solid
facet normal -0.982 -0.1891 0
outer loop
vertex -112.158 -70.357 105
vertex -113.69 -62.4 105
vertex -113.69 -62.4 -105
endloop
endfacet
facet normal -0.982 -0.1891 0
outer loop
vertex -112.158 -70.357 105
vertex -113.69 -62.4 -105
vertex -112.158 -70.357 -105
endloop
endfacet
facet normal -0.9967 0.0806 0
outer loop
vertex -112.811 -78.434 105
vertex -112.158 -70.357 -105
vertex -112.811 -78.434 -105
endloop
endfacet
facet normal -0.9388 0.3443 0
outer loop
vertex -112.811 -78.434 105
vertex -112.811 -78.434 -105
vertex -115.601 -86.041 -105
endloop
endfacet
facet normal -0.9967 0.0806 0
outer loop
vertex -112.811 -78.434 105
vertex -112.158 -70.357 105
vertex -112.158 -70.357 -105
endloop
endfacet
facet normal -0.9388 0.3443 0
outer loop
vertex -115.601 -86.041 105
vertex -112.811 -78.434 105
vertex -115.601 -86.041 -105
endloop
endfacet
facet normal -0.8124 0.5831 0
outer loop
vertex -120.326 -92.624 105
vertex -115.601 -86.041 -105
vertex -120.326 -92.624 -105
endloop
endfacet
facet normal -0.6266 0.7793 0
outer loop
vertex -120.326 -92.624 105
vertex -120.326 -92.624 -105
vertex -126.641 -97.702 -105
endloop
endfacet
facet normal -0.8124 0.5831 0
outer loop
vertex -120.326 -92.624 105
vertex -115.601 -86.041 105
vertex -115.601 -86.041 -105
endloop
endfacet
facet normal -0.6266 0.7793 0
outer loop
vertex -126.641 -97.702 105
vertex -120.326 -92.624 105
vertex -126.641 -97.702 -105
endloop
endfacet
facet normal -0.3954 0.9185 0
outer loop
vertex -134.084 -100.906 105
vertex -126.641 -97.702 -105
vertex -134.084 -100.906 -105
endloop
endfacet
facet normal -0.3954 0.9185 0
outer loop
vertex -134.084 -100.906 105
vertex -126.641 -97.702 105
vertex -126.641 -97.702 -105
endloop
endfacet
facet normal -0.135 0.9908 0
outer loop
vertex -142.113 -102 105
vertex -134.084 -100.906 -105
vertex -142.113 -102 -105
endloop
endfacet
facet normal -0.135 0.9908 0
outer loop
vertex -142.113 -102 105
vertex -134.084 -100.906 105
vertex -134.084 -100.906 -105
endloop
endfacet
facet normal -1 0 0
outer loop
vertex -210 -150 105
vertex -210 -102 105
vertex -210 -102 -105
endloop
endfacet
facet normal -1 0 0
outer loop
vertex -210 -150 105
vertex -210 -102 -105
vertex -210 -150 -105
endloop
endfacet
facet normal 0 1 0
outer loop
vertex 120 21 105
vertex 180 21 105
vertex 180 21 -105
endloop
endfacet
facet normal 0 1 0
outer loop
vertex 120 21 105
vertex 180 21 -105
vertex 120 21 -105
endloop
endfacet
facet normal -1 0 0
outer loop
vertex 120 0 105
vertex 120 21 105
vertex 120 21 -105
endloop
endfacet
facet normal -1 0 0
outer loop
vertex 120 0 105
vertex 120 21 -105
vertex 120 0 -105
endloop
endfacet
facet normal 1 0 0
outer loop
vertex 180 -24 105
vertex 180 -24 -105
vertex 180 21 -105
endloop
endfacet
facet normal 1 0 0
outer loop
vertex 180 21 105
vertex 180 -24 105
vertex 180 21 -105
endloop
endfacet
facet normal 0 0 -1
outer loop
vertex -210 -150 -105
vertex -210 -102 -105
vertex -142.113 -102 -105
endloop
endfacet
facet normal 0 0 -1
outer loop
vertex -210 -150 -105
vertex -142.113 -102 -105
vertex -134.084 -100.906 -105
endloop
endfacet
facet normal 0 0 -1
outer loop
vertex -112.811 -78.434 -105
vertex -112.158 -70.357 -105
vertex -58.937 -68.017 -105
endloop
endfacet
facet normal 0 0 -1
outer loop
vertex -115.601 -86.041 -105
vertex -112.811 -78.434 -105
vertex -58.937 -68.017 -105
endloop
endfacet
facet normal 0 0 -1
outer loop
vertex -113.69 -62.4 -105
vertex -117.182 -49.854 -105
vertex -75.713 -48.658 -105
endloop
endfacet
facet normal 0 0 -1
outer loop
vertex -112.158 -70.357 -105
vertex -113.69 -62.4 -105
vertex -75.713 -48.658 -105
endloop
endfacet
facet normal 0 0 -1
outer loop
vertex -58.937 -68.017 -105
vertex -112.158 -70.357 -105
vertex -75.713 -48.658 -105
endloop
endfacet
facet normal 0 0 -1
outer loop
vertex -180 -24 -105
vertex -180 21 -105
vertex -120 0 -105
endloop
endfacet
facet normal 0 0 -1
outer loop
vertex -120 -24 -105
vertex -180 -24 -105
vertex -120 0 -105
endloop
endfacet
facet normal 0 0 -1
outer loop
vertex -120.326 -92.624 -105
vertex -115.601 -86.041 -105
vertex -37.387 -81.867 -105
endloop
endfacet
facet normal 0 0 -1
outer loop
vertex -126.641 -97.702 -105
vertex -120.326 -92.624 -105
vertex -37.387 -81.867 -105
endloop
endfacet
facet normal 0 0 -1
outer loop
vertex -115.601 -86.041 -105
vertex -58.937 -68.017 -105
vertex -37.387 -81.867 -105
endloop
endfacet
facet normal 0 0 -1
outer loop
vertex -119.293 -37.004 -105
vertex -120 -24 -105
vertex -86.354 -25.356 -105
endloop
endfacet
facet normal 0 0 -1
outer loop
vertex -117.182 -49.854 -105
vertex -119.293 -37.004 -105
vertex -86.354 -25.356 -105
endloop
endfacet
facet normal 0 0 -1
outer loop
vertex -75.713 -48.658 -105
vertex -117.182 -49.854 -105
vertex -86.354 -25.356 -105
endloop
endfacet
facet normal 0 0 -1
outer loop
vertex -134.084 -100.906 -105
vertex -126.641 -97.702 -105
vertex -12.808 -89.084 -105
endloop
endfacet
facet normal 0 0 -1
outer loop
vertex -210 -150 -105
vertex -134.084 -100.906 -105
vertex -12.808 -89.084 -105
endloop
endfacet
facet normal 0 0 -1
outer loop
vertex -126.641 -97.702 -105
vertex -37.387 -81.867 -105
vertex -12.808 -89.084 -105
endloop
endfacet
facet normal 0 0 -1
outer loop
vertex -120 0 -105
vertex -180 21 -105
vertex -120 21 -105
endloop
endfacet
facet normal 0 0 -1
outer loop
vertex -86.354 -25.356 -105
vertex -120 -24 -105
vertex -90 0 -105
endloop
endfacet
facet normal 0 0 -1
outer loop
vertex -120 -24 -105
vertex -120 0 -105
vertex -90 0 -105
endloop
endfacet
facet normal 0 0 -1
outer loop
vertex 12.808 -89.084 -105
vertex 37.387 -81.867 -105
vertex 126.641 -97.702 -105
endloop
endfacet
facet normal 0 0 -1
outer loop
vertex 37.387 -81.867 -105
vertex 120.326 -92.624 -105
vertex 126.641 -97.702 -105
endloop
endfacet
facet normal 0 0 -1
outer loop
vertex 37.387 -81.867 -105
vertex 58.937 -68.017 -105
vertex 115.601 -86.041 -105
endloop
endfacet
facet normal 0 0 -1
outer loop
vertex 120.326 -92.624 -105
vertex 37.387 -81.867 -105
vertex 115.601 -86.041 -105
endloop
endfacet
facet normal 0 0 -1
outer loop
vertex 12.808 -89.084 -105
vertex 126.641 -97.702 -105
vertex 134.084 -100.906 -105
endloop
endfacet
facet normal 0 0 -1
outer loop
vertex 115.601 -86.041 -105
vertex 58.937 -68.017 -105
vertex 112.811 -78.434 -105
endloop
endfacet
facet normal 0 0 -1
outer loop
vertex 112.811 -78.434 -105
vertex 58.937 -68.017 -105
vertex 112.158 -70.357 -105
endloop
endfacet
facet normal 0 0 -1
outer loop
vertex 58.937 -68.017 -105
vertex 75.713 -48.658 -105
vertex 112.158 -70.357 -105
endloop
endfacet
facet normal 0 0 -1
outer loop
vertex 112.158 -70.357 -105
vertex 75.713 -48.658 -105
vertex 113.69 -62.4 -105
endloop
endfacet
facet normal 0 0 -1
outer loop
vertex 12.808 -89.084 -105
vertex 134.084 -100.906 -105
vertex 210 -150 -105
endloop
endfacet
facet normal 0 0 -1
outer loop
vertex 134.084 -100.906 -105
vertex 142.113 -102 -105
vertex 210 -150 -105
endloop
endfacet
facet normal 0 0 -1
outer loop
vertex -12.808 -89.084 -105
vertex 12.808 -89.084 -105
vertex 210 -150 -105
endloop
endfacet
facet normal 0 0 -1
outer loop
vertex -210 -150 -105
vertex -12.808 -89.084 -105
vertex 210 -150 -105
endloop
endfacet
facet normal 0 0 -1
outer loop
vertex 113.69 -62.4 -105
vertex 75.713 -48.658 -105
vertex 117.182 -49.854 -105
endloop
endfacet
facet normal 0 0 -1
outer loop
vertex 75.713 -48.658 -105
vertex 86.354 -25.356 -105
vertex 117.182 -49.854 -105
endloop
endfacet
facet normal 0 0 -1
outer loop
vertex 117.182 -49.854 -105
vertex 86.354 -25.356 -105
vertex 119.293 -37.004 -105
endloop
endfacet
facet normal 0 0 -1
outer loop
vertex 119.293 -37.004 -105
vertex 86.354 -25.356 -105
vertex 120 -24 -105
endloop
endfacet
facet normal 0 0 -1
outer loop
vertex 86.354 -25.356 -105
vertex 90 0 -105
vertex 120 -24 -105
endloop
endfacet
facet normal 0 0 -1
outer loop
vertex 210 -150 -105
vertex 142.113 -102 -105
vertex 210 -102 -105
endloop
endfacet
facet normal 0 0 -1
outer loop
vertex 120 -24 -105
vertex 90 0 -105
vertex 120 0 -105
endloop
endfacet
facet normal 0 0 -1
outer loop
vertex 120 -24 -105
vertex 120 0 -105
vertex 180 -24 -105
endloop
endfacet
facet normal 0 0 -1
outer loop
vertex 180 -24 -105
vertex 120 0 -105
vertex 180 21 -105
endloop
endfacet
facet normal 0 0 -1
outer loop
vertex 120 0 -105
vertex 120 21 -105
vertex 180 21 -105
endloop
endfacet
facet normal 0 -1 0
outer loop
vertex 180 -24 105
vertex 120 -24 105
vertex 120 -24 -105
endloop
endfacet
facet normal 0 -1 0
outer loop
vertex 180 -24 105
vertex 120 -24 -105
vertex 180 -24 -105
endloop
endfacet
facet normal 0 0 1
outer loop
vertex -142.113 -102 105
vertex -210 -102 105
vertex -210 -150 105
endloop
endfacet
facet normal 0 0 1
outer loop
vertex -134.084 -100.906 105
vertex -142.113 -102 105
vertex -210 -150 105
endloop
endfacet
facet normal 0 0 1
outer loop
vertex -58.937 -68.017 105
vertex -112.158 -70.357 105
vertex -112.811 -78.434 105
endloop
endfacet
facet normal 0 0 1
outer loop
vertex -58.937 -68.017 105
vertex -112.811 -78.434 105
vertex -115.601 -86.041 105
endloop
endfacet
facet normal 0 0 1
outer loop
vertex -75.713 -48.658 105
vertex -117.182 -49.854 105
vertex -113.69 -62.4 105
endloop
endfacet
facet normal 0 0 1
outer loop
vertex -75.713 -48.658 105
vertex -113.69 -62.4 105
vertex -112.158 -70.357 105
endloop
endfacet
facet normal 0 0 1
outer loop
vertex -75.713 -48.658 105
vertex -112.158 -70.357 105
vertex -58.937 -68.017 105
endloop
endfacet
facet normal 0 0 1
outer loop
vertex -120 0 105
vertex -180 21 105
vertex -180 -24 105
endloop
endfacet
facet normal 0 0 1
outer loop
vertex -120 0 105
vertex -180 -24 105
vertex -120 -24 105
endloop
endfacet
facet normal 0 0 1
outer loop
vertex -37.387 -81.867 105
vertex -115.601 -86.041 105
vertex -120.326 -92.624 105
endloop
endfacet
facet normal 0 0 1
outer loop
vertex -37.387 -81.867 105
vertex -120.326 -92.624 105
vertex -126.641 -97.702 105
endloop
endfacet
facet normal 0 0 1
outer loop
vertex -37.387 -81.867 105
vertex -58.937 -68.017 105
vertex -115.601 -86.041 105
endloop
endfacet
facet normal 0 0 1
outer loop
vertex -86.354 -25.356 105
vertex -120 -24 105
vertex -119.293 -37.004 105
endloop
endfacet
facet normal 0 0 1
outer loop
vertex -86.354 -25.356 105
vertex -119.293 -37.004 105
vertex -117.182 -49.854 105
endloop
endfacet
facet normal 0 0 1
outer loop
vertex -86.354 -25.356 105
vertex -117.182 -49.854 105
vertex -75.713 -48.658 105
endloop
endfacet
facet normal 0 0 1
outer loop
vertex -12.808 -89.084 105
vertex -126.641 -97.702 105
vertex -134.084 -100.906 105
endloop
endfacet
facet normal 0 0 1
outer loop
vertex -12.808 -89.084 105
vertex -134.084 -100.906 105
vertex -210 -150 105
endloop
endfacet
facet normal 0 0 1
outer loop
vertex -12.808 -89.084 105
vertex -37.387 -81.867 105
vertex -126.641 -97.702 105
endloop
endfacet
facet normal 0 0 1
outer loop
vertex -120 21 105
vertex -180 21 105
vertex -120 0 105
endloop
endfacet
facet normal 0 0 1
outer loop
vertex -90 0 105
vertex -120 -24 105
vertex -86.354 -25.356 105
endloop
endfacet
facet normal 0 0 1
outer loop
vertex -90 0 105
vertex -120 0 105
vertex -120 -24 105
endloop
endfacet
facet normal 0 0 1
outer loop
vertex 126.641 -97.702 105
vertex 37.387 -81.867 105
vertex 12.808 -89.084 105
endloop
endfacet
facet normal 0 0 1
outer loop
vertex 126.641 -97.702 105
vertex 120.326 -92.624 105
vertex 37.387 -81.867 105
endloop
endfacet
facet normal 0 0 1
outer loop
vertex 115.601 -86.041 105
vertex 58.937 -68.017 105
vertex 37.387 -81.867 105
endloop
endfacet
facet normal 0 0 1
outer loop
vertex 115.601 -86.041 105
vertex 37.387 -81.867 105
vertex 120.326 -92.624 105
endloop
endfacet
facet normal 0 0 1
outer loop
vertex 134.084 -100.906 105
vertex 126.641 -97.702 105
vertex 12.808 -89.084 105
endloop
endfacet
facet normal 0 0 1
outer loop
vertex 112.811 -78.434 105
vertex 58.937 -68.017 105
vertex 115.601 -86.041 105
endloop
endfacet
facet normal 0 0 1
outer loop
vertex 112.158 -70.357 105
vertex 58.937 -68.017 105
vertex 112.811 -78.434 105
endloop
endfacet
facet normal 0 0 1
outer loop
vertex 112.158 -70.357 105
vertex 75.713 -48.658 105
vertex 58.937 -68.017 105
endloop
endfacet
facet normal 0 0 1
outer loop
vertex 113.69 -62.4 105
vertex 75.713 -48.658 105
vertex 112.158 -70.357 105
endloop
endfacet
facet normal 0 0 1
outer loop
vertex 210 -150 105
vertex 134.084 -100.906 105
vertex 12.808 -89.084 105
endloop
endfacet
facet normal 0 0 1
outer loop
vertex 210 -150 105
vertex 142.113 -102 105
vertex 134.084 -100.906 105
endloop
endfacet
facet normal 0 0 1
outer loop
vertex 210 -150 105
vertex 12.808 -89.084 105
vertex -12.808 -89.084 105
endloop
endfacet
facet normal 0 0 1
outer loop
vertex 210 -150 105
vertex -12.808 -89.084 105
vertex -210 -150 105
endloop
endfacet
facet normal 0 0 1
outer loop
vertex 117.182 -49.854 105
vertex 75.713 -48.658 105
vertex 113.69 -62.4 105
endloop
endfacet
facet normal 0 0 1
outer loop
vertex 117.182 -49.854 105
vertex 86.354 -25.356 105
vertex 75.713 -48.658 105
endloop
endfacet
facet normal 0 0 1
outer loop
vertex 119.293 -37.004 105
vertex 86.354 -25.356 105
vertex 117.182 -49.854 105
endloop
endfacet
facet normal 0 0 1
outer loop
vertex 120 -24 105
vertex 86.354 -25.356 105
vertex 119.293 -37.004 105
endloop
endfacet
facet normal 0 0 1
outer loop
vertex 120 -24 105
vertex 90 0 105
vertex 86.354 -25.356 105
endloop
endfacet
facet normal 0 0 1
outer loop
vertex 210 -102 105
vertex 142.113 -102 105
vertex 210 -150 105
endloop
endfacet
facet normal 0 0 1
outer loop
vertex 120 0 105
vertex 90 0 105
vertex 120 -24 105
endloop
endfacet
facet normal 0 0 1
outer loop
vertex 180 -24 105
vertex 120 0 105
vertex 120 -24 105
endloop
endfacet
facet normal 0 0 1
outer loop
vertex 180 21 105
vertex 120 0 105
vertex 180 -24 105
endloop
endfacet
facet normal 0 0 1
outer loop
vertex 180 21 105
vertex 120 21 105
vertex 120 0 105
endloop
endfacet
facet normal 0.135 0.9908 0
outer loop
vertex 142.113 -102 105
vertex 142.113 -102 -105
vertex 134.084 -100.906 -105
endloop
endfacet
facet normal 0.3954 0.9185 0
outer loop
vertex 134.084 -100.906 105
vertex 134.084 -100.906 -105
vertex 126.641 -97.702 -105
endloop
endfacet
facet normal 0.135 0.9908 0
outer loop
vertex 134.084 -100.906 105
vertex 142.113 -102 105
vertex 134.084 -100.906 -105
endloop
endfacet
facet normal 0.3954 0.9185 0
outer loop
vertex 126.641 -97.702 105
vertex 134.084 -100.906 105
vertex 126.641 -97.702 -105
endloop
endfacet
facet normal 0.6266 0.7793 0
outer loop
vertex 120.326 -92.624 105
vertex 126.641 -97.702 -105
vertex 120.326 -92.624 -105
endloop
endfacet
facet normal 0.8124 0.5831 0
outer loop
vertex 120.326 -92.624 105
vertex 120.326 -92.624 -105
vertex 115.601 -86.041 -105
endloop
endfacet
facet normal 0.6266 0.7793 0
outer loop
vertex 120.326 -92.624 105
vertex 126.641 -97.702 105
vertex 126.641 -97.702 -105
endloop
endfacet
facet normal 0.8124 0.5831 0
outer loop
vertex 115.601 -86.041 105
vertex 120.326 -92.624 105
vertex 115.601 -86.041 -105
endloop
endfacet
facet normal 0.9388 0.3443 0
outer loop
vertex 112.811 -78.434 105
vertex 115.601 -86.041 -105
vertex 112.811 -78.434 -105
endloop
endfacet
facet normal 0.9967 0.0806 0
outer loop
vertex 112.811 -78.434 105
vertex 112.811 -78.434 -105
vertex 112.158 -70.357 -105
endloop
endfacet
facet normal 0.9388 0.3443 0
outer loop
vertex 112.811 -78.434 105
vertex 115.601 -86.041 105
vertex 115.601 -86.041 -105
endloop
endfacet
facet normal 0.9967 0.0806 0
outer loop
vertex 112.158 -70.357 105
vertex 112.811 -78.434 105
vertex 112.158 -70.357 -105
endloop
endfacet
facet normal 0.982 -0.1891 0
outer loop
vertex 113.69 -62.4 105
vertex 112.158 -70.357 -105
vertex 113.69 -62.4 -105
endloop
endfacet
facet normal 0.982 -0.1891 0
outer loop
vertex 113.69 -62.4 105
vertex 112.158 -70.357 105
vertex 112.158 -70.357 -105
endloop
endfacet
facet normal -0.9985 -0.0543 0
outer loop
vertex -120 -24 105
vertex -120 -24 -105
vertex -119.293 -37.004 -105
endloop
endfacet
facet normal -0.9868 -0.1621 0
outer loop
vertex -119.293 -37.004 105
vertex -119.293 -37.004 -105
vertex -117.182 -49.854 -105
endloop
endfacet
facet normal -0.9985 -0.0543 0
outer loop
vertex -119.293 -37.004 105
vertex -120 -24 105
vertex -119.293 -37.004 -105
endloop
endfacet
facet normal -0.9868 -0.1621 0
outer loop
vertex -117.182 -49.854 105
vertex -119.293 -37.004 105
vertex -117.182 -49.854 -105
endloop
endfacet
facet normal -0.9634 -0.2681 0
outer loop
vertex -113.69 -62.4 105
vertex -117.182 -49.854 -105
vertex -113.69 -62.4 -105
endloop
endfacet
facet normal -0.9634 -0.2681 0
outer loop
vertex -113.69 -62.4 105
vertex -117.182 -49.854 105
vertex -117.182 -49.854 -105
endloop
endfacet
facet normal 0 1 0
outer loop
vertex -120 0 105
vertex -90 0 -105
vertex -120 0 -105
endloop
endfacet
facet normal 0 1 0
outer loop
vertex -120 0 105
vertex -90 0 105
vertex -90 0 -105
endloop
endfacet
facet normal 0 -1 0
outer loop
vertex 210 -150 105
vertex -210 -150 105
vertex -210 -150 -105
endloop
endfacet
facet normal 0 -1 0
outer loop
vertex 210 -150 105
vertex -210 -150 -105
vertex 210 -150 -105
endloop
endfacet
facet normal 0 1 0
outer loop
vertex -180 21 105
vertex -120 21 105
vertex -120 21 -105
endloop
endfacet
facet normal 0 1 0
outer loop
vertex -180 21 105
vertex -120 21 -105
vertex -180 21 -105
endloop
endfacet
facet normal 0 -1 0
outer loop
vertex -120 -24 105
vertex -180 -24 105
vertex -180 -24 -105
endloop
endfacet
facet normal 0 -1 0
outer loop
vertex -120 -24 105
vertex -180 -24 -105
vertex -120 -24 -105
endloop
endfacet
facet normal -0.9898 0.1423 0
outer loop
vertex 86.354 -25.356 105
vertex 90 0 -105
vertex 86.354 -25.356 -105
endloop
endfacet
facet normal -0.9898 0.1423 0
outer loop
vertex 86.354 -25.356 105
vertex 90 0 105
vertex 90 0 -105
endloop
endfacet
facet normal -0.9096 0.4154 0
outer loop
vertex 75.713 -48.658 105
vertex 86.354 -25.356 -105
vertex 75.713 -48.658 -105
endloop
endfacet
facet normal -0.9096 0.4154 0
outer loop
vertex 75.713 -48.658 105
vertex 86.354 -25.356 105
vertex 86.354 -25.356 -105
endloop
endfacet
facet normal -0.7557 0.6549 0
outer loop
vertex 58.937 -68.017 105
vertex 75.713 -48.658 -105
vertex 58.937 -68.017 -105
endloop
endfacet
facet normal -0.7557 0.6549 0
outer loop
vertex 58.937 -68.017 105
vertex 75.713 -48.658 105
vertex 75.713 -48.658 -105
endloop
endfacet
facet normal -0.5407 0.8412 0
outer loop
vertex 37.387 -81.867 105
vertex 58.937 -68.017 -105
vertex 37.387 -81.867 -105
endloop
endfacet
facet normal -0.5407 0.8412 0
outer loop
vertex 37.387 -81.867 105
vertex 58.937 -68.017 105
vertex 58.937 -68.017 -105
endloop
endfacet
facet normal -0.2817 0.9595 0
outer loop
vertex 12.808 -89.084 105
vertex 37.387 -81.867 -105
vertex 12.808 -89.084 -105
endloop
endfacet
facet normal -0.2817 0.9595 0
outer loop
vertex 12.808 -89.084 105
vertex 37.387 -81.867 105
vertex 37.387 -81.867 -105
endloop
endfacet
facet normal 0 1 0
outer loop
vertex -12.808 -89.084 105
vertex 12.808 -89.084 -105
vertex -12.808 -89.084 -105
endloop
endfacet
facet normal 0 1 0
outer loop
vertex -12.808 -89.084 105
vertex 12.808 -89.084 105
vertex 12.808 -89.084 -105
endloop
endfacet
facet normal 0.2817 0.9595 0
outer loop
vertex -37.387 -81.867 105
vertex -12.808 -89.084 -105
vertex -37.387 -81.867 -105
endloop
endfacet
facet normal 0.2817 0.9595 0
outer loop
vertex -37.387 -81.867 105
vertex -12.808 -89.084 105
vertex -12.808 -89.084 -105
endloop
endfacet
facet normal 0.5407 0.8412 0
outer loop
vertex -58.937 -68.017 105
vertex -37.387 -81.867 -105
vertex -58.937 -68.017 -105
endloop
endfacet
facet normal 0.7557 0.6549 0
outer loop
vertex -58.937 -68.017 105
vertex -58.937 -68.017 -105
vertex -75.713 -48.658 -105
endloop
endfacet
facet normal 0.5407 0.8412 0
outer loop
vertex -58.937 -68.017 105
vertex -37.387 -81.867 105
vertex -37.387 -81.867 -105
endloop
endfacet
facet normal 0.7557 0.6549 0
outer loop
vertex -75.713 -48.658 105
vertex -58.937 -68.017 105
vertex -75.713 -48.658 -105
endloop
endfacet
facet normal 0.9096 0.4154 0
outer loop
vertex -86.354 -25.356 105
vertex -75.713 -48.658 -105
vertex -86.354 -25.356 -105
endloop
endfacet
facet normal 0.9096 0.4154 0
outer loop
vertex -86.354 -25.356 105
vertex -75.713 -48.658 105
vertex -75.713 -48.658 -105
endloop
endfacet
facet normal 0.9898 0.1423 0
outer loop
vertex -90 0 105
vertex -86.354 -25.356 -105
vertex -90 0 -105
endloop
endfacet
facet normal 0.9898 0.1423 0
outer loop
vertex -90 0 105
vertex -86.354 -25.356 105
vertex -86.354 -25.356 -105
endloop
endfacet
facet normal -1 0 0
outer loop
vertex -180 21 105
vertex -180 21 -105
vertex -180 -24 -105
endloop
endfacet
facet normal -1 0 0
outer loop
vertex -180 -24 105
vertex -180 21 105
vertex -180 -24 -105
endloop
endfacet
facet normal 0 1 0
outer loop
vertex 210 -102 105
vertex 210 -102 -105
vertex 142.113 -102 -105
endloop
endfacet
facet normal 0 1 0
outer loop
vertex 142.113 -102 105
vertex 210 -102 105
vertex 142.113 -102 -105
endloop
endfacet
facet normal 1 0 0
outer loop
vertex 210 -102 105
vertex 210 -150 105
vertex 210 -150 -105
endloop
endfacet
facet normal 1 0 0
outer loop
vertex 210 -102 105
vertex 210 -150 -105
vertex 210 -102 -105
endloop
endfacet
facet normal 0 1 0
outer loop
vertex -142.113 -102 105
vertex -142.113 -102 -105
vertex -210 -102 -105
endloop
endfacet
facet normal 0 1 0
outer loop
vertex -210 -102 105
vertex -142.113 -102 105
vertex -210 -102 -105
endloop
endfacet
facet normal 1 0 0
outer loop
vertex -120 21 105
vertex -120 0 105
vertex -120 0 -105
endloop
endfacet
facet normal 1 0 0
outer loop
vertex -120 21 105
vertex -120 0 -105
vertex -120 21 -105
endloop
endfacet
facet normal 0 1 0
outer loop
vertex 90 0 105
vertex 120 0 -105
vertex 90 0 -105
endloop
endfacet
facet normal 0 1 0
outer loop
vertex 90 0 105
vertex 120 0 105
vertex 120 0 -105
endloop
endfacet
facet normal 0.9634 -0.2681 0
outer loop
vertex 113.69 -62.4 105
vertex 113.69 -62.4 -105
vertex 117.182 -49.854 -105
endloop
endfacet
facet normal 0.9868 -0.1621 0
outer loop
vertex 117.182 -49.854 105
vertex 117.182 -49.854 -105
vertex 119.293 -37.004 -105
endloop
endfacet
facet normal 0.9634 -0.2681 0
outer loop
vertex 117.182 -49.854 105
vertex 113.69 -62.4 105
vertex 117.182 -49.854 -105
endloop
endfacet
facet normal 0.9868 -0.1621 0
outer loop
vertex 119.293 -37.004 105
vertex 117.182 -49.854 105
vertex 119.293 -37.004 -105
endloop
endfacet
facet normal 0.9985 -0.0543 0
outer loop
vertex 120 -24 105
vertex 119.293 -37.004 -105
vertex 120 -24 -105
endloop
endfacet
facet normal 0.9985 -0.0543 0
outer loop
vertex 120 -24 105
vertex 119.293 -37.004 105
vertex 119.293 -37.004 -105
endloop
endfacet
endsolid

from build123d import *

# Parameters (mm, degrees)
SALIENTE_EXTRUIR1_DEPTH = 105


with BuildPart() as part:
    # Croquis1 → Saliente-Extruir1 (new, symmetric)
    with BuildSketch(Plane.XY):
        with BuildLine():
            Line((-90, 0), (-120, 0))
            Line((-120, 0), (-120, 21))
            Line((-120, 21), (-180, 21))
            Line((-180, 21), (-180, -24))
            Line((-180, -24), (-120, -24))
            ThreePointArc((-120, -24), (-118.412019266, -43.457484251), (-113.69010511, -62.4))
            ThreePointArc((-113.69010511, -62.4), (-117.740516174, -89.492855685), (-142.112631388, -102))
            Line((-142.112631388, -102), (-210, -102))
            Line((-210, -102), (-210, -150))
            Line((-210, -150), (210, -150))
            Line((210, -150), (210, -102))
            Line((210, -102), (142.112631388, -102))
            ThreePointArc((142.112631388, -102), (117.740516174, -89.492855685), (113.69010511, -62.4))
            ThreePointArc((113.69010511, -62.4), (118.412019266, -43.457484251), (120, -24))
            Line((120, -24), (180, -24))
            Line((180, -24), (180, 21))
            Line((180, 21), (120, 21))
            Line((120, 21), (120, 0))
            Line((120, 0), (90, 0))
            ThreePointArc((90, 0), (0, -90), (-90, 0))
        make_face()
    extrude(amount=SALIENTE_EXTRUIR1_DEPTH, both=True)


solid = part.part
